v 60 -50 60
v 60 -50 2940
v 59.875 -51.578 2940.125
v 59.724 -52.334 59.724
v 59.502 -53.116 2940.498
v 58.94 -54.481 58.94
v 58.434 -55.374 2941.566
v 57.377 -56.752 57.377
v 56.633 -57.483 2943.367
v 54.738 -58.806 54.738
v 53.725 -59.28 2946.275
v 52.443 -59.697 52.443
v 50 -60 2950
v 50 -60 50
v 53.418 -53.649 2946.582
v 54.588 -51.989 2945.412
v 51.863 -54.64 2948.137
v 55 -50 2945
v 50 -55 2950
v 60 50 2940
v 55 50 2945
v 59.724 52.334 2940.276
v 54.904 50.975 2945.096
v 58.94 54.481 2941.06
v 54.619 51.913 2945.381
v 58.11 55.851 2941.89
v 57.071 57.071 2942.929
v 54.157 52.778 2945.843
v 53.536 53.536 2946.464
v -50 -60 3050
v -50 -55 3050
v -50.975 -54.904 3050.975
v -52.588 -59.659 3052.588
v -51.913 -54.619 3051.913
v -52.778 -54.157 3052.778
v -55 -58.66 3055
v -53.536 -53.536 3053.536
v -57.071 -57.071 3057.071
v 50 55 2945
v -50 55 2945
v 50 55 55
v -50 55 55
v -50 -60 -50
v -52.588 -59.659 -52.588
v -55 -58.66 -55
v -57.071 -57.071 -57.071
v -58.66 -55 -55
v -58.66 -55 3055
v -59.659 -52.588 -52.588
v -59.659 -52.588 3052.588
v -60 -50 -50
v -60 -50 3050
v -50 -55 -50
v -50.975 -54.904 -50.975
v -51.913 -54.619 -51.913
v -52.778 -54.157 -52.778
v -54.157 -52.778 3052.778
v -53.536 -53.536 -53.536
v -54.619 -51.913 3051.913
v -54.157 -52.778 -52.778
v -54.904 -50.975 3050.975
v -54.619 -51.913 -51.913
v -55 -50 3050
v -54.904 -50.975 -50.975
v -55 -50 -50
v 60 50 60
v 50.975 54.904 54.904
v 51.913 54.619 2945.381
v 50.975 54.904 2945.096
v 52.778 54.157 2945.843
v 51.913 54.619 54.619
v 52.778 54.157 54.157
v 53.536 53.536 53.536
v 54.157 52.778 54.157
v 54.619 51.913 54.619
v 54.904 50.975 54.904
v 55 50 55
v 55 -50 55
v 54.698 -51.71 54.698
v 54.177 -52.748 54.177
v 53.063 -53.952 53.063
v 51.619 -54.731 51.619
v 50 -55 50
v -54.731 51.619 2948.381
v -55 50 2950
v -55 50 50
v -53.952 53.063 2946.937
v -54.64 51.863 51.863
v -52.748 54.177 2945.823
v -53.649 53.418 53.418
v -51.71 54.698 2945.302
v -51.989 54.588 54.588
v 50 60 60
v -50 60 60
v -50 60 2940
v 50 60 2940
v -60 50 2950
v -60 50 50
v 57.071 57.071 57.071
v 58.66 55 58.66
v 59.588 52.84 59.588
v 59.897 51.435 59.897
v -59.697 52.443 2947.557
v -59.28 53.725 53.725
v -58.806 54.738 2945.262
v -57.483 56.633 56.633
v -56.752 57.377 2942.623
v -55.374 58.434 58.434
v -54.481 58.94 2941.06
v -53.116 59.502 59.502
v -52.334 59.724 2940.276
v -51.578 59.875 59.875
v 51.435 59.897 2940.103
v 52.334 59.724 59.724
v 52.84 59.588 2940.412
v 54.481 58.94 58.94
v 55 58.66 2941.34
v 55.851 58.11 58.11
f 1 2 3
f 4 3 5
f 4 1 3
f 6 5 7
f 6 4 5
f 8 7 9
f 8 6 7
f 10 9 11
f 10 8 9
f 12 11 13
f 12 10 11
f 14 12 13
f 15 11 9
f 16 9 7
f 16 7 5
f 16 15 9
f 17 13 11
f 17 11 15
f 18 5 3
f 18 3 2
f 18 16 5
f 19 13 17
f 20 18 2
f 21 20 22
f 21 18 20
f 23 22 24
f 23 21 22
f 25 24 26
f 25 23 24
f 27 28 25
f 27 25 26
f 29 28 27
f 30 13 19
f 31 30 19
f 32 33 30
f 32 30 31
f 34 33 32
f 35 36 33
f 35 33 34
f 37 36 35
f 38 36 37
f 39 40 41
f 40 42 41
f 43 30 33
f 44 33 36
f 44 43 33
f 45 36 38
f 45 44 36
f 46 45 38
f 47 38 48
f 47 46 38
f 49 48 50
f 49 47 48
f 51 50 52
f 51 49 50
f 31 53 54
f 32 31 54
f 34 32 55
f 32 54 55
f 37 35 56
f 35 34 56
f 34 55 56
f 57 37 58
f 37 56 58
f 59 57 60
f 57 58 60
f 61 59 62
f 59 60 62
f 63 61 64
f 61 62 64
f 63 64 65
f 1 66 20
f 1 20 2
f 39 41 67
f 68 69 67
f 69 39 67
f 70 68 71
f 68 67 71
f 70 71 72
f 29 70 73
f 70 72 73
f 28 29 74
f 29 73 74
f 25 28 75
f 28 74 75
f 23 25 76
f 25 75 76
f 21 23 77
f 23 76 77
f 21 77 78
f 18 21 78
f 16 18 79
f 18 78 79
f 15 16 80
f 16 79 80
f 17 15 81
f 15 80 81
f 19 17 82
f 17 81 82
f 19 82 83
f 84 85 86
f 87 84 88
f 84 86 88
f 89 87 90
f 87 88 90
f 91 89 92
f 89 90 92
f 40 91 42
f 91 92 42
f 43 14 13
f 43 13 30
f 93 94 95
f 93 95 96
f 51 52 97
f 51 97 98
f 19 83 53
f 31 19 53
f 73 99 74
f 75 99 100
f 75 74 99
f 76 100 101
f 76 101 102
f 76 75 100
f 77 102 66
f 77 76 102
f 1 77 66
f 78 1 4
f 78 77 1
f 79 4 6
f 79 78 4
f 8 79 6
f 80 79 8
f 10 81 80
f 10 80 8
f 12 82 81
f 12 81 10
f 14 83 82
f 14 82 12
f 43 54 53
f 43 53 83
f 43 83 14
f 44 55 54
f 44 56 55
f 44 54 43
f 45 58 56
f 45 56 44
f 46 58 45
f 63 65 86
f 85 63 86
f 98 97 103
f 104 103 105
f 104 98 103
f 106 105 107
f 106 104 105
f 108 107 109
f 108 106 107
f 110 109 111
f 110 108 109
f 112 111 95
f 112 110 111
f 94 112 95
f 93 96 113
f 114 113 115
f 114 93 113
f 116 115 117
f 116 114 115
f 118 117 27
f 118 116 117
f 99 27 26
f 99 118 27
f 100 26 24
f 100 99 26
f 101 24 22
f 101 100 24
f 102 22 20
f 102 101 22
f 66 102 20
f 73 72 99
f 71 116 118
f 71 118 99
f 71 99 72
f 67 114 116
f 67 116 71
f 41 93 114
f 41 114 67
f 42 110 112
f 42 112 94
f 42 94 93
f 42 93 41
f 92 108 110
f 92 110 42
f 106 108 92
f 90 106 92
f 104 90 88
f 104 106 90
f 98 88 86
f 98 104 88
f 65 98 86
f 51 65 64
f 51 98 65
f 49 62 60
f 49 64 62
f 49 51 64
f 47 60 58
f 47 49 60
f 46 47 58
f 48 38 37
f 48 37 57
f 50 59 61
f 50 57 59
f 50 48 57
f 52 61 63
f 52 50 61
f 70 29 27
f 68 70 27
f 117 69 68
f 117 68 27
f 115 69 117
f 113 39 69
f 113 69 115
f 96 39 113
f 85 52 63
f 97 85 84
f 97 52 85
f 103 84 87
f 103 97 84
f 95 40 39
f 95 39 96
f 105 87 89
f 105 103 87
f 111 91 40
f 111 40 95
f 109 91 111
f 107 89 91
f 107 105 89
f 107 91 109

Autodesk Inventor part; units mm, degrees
ref_plane "Start Plane" through (0, 0, -57.0711) normal (0, 0, 1) x (1, 0, 0)
ref_plane "End Plane" through (0, 0, 3057.0711) normal (0, 0, 1) x (1, 0, 0)
sketch "Sketch" plane through (0, 0, 0) normal (0, 0, 1) x (1, 0, 0)
  line L0 (-60, -50) -> (-60, 50)
  line L1 (-50, 60) -> (50, 60)
  line L2 (60, 50) -> (60, -50)
  line L3 (50, -60) -> (-50, -60)
  arc A0 (-60, -50) -> (-50, -60) centre (-50, -50) ccw
  arc A1 (60, 50) -> (50, 60) centre (50, 50) ccw
  arc A2 (-50, 60) -> (-60, 50) centre (-50, 50) ccw
  arc A3 (50, -60) -> (60, -50) centre (50, -50) ccw
  arc A4 (-50, 55) -> (-55, 50) centre (-50, 50) ccw
  line L4 (-50, 55) -> (50, 55)
  arc A5 (55, 50) -> (50, 55) centre (50, 50) ccw
  line L5 (55, 50) -> (55, -50)
  arc A6 (50, -55) -> (55, -50) centre (50, -50) ccw
  line L6 (50, -55) -> (-50, -55)
  arc A7 (-55, -50) -> (-50, -55) centre (-50, -50) ccw
  line L7 (-55, -50) -> (-55, 50)
  line L8 (0, 86.8995) -> (0, -86.8995) construction
  line L9 (-86.8995, 0) -> (86.8995, 0) construction
  dimension "d7" = 10
  dimension "d9" = 120
  dimension "d11" = 120
  dimension "d12" = 5
  dimension "d15" = 60
  dimension "d16" = 60
extrude "Body" add sketch "Sketch" along normal up to surface (3114.1421 mm away) from surface at -57.0711
sketch "Sketch3" plane through (0, 0, 0) normal (0, 0, 1) x (1, 0, 0)
  line L0 (0, 0) -> (10, 0)
ref_plane "Work Plane3" through (0, 0, 0) normal (0, -1, 0) x (1, 0, 0)
ref_plane "Work Plane4" through (-60, 0, 3060) normal (0.7071, 0, 0.7071) x (0.7071, 0, -0.7071)
split "Split1" plane through (-60, 0, 3060) removes the side toward (0.7071, 0, 0.7071)
ref_plane "Work Plane5" through (0, -60, 3060) normal (0, 0.7071, 0.7071) x (1, 0, 0)
split "Split2" plane through (0, -60, 3060) removes the side toward (0, 0.7071, 0.7071)
ref_plane "Work Plane6" through (0, -60, -60) normal (0, 0.7071, -0.7071) x (1, 0, 0)
split "Split3" plane through (0, -60, -60) removes the side toward (0, 0.7071, -0.7071)
ref_plane "Work Plane7" through (-60, 0, -60) normal (0.7071, 0, -0.7071) x (-0.7071, 0, -0.7071)
split "Split4" plane through (-60, 0, -60) removes the side toward (0.7071, 0, -0.7071)
sketch "Sketch4" plane through (0, 0, 0) normal (0, -1, 0) x (1, 0, 0)
  line L0 (-2, -57.0711) -> (12, -57.0711) projected
  line L1 (-2, 3057.0711) -> (12, 3057.0711) projected
  dimension "d18" = 3114.1421
equation "\"d7\" = G_IR"
equation "\"d9\" = G_W"
equation "\"d11\" = G_H"
equation "\"d12\" = G_T"
equation "\"d15\" = 0.5 * d9"
equation "\"d16\" = 0.5 * d11"
equation "\"d3\" = G_L"
equation "\"G_W\" = 120"
equation "\"G_H\" = 120"
equation "\"G_T\" = 5"
equation "\"G_IR\" = 10"
equation "\"G_L\" = d18"
equation "\"G_OFFSET_START\" = 57.07107"
equation "\"G_OFFSET_END\" = 57.07107"
equation "\"d13\" = -G_OFFSET_START"
equation "\"d14\" = G_OFFSET_END + B_L"
equation "\"B_L\" = 3000"
properties part number "ISO 10799-2 - 120x120x5 - 3114,14" material "Steel, Mild"
